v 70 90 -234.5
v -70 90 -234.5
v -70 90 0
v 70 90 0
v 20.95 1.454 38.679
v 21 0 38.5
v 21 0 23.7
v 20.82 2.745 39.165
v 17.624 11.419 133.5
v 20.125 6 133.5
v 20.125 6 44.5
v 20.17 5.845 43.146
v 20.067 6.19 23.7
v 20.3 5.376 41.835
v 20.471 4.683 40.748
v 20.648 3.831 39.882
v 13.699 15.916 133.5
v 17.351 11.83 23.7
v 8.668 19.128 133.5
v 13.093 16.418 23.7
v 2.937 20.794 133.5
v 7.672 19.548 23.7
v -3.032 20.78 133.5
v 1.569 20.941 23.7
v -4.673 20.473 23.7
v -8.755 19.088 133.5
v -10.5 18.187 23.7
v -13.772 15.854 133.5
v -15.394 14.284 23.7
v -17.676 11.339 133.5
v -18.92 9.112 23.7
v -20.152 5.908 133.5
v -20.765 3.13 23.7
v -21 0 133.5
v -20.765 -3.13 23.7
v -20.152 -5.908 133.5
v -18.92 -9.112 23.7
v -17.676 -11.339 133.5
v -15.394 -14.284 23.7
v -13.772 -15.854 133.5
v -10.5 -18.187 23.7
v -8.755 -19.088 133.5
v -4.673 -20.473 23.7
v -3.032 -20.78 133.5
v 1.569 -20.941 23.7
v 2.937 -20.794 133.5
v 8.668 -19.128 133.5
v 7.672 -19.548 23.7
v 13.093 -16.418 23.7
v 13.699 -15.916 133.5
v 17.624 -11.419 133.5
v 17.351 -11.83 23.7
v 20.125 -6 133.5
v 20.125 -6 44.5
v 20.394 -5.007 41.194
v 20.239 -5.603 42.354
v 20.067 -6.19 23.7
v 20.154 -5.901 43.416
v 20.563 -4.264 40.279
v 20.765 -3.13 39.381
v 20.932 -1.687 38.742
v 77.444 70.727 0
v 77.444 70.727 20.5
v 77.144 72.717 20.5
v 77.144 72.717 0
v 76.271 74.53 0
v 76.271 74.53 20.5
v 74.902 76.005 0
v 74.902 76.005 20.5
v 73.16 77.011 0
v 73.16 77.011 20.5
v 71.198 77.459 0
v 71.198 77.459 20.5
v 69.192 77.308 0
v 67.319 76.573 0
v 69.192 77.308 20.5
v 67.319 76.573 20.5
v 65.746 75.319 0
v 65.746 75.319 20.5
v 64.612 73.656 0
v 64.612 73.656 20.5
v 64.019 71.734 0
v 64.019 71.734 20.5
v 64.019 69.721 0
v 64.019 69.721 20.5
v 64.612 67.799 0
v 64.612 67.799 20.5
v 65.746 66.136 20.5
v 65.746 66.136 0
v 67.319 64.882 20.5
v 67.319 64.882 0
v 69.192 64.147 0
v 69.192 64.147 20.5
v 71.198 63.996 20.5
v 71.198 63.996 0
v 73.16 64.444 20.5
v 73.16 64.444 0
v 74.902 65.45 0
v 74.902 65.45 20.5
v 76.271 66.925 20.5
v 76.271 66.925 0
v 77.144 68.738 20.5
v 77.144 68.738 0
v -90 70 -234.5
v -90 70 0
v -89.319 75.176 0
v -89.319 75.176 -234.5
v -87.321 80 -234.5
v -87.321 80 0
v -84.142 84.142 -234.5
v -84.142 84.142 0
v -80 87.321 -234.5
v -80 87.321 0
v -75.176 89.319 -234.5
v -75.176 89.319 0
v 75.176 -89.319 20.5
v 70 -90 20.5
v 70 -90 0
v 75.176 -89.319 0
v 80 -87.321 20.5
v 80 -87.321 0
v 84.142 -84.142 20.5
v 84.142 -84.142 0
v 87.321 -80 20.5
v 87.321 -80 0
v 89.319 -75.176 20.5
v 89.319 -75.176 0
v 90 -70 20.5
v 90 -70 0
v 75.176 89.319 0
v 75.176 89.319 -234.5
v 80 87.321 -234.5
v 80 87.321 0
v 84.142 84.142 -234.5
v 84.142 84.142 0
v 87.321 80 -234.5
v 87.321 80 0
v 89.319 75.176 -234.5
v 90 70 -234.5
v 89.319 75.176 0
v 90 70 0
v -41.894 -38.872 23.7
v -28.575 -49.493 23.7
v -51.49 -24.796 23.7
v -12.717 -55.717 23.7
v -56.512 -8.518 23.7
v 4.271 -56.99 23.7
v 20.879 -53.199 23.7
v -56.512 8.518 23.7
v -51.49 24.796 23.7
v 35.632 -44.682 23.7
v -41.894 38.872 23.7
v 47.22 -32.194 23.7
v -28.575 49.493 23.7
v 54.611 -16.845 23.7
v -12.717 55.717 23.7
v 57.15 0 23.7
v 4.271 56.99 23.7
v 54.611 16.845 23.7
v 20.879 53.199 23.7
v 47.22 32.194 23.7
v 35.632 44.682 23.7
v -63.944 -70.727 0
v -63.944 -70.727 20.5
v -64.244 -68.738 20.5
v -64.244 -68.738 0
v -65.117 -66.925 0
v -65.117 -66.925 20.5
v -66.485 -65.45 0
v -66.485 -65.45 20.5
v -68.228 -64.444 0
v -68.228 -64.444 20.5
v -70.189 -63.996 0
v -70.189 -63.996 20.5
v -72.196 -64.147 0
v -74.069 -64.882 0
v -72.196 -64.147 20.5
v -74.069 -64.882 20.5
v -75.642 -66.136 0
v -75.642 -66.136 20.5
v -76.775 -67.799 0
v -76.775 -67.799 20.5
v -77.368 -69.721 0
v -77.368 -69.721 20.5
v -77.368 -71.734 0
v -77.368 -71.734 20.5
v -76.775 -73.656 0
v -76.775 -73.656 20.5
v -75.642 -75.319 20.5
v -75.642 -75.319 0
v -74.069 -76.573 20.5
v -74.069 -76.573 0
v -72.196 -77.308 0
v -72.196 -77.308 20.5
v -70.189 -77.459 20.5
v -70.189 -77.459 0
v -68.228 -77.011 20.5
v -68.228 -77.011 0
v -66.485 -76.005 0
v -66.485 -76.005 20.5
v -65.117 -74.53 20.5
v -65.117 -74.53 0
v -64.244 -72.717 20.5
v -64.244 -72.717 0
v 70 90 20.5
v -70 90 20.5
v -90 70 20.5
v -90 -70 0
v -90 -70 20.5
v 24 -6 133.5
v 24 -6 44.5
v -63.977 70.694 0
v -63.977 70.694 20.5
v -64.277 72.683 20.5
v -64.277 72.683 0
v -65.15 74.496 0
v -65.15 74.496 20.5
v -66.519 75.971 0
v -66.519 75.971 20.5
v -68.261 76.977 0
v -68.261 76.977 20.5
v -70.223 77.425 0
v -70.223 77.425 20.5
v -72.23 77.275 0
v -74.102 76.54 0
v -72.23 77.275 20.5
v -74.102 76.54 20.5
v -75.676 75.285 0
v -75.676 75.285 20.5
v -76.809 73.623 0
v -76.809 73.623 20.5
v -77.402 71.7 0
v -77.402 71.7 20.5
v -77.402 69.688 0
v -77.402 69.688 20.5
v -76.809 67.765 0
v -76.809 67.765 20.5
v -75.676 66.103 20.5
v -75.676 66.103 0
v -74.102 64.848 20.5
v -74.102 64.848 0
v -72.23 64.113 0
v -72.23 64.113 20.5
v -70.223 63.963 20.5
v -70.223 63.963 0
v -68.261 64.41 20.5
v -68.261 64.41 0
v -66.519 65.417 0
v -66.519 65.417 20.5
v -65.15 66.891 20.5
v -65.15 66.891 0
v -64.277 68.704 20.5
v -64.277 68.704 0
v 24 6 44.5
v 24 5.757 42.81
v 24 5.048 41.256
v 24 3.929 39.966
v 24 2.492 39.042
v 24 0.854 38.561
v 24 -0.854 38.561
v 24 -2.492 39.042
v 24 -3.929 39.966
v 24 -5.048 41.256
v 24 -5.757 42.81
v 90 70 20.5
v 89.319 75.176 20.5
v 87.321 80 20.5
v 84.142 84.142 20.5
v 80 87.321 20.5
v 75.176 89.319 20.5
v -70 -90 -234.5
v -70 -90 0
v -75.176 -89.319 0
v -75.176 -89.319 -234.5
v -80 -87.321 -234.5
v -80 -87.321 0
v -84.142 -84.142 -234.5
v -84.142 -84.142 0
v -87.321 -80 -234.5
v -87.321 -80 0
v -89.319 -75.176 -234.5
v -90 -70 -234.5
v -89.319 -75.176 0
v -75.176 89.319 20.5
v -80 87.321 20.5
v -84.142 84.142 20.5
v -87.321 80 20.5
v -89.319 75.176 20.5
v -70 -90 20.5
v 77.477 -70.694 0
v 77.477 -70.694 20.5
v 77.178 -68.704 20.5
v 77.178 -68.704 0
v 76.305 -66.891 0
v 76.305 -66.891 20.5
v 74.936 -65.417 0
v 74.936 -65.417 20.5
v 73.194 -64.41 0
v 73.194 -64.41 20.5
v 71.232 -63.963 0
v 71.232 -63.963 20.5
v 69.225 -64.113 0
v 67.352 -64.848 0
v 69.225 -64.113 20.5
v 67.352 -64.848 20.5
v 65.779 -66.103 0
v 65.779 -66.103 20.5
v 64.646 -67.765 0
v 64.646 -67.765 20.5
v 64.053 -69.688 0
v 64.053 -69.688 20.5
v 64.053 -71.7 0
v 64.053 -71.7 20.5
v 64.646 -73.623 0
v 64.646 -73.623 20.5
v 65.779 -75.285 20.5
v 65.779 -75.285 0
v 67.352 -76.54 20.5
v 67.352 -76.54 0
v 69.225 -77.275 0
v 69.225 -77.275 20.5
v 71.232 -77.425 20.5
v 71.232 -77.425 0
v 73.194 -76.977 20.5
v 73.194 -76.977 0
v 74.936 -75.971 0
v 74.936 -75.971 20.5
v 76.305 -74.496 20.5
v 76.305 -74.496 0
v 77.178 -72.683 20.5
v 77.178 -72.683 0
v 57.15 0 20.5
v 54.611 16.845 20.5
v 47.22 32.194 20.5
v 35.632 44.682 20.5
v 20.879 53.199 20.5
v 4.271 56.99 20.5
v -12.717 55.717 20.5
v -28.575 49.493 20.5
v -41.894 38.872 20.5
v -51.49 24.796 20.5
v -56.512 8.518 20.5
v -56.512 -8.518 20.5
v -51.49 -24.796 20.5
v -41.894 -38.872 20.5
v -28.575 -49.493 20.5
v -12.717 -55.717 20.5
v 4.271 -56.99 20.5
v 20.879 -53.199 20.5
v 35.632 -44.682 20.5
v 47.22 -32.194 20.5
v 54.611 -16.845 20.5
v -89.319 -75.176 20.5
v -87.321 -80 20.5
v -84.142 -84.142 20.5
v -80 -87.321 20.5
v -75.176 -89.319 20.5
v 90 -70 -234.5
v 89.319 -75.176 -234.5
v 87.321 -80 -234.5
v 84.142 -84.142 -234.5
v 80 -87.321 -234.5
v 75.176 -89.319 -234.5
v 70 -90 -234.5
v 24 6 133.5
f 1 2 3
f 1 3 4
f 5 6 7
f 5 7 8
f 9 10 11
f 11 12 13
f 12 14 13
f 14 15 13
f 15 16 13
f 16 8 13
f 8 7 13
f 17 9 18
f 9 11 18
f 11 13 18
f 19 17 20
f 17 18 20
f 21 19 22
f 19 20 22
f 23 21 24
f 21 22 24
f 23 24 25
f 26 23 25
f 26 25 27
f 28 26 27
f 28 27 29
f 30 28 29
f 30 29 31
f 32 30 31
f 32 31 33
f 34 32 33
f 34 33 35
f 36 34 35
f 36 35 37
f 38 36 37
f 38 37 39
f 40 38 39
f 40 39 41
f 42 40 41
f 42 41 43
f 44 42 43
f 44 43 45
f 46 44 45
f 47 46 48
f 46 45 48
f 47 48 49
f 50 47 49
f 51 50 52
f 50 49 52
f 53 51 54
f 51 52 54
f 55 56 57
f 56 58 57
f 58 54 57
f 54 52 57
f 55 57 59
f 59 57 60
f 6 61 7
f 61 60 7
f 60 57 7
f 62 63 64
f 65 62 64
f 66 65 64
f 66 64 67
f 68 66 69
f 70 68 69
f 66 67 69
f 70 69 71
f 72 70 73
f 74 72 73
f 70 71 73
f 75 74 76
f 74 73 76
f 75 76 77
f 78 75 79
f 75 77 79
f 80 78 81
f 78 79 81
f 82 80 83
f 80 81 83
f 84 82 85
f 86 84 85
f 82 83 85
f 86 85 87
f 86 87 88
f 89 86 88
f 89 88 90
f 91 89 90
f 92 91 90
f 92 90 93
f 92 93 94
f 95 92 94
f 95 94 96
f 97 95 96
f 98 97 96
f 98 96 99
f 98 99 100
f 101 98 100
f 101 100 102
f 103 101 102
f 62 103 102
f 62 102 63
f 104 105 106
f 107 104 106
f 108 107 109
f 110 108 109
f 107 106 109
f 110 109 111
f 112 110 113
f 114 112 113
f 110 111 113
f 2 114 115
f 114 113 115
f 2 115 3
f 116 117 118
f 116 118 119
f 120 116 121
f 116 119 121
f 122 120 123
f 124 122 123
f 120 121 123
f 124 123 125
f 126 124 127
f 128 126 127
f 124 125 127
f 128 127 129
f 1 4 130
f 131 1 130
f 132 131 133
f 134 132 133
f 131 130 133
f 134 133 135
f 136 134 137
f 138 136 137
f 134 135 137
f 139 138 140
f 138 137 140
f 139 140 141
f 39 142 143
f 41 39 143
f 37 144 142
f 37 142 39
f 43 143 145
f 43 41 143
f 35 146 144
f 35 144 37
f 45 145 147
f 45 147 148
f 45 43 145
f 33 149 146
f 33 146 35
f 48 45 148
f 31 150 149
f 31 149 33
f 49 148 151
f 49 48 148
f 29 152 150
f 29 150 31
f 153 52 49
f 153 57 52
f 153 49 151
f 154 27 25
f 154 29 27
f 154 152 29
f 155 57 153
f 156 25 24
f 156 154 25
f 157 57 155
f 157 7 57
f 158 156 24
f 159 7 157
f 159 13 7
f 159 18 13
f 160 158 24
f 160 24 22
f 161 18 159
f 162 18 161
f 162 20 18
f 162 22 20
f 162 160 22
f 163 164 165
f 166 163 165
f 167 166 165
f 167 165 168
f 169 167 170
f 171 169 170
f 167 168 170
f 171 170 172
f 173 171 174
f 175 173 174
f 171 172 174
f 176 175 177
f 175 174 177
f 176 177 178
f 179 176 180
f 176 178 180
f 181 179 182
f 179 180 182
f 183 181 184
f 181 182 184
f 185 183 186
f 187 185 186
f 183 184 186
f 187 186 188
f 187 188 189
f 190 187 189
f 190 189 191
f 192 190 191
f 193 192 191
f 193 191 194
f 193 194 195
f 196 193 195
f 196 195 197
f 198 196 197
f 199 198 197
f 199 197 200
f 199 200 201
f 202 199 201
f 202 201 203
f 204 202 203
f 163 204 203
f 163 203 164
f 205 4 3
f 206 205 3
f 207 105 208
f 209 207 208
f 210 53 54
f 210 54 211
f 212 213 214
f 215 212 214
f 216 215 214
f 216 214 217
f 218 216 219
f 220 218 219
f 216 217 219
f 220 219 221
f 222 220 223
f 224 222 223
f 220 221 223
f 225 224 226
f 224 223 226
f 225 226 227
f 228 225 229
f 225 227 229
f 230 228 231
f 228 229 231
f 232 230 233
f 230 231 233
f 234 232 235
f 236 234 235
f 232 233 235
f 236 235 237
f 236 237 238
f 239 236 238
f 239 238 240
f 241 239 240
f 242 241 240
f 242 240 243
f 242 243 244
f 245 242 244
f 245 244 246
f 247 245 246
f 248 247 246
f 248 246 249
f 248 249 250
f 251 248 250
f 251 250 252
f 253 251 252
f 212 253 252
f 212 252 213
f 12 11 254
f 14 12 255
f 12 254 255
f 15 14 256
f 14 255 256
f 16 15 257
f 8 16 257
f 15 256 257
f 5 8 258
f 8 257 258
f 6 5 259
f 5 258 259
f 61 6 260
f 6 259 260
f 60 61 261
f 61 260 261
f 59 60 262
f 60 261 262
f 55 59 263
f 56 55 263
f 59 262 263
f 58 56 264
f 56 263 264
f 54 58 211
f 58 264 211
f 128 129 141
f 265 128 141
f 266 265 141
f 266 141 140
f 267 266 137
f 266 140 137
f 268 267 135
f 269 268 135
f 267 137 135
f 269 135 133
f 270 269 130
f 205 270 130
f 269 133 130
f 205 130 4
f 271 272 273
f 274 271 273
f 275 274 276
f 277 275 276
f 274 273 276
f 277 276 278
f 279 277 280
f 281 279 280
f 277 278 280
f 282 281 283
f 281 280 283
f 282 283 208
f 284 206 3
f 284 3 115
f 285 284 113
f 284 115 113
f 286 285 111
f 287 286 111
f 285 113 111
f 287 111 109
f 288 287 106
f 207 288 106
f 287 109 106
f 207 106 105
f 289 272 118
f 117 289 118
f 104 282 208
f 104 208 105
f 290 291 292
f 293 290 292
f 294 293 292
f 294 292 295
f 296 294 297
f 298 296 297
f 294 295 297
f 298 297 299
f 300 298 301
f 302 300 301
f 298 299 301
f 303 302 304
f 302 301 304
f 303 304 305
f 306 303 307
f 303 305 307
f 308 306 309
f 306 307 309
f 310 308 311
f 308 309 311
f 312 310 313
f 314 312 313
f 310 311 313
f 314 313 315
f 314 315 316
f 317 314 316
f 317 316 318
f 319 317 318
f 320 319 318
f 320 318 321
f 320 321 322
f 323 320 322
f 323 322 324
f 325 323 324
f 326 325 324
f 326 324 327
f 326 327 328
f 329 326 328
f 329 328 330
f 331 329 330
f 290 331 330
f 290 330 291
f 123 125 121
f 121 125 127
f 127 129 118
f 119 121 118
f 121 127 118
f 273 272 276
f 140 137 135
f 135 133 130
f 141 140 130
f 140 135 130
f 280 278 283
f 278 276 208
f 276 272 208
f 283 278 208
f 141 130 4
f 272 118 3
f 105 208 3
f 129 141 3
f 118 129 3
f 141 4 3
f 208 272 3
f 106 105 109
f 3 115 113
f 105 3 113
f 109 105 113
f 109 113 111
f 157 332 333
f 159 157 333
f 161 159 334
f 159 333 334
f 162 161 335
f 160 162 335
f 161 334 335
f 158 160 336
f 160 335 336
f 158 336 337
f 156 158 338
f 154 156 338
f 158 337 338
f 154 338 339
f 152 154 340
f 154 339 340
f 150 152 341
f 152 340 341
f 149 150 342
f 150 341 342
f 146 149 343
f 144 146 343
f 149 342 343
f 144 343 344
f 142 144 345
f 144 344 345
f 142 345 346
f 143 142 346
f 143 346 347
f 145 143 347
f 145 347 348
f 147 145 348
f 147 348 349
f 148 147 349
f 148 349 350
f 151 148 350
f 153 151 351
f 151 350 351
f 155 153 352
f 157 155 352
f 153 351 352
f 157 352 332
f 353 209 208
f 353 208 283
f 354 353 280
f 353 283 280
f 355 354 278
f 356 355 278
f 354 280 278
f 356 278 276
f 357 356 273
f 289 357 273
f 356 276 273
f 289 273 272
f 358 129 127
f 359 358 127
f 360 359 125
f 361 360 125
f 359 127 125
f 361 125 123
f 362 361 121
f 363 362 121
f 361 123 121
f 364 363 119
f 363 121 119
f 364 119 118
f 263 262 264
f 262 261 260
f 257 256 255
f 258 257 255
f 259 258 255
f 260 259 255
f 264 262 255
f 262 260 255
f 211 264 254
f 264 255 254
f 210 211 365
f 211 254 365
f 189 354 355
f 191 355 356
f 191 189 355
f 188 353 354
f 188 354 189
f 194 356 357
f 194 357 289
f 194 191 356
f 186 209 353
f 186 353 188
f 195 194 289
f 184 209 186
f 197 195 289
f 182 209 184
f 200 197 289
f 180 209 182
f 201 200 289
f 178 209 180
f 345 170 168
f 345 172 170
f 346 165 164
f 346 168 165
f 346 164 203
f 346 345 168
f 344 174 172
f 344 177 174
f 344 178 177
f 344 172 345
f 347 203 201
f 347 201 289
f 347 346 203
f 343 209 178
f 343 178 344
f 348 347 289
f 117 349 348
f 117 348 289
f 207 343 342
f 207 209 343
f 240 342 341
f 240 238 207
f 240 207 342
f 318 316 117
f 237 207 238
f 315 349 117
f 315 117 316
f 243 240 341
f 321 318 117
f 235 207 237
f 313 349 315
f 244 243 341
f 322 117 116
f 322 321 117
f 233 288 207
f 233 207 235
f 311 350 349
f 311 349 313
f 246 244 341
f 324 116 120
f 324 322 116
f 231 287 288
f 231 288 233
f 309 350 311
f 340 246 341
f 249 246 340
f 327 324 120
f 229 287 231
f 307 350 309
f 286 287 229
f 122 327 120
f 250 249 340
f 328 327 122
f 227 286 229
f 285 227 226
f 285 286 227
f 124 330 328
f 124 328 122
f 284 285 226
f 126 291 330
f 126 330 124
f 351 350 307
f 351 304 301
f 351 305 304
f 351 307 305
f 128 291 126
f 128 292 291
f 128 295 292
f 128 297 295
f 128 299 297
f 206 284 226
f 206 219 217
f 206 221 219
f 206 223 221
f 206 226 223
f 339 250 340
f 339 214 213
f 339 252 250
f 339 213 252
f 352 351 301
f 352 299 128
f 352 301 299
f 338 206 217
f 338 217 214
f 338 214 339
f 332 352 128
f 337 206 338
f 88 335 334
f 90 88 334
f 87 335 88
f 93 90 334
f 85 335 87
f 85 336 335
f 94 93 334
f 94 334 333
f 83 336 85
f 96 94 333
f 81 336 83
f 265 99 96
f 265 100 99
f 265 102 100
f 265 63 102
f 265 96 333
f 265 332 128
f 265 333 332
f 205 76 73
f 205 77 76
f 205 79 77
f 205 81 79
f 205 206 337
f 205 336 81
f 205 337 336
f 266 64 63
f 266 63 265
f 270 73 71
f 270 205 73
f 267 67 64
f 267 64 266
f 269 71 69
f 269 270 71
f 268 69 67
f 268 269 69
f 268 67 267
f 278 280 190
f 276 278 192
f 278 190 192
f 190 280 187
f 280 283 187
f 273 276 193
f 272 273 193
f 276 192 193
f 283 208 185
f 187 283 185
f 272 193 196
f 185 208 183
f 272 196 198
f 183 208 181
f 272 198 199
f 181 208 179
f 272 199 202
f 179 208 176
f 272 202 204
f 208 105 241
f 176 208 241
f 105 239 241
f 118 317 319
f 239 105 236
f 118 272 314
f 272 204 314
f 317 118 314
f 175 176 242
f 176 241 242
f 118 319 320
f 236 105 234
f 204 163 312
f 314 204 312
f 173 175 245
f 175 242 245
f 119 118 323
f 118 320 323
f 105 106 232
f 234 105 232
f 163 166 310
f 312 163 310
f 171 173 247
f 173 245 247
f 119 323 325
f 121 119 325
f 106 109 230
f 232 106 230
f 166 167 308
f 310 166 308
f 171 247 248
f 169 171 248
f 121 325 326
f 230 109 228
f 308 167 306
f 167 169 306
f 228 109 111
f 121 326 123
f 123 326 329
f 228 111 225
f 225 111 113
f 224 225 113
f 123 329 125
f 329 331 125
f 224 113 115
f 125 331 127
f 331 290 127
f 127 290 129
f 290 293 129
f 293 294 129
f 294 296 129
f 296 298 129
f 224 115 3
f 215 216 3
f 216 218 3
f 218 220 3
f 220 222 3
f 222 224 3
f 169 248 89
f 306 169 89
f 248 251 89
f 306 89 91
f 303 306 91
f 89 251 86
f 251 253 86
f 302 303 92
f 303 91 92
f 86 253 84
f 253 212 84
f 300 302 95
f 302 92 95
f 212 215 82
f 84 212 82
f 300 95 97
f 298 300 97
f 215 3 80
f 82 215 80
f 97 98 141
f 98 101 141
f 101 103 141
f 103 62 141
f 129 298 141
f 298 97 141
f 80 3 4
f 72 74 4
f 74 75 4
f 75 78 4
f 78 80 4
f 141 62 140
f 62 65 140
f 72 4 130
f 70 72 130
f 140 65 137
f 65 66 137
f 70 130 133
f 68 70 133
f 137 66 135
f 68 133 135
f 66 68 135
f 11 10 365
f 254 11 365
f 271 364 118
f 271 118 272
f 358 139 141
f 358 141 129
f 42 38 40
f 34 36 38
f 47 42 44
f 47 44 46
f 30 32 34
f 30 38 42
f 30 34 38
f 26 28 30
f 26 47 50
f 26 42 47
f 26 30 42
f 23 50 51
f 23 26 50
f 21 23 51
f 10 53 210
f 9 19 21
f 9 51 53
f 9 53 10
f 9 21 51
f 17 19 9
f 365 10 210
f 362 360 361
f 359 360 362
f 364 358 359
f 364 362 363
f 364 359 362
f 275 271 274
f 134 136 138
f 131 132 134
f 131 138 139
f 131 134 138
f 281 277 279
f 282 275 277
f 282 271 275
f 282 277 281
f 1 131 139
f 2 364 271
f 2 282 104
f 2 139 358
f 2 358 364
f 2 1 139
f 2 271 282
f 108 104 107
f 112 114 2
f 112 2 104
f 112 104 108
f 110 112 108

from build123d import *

# Parameters (mm, degrees)
EXTRUDE_1_DEPTH      = 20.5
CUT_EXTRUDE_1_REACH  = 130.92
SKETCH_2_R           = 6.75
EXTRUDE_2_DEPTH      = 234.5
SKETCH_4_R           = 57.15
EXTRUDE_3_DEPTH      = 3.2
SKETCH_5_R           = 21
EXTRUDE_4_DEPTH      = 109.8
SKETCH_6_W           = 8
SKETCH_6_H           = 12
EXTRUDE_5_DEPTH      = 89
EXTRUDE_6_REACH      = 277.837
EXTRUDE_6_END_RADIUS = 21


with BuildPart() as part:
    # 草图1 → 凸台-拉伸1 (new body)
    with BuildSketch(Plane.XY):
        with BuildLine():
            Line((-70, -90), (70, -90))
            ThreePointArc((70, -90), (84.142135624, -84.142135624), (90, -70))
            Line((90, -70), (90, 70))
            ThreePointArc((90, 70), (84.142135624, 84.142135624), (70, 90))
            Line((70, 90), (-70, 90))
            ThreePointArc((-70, 90), (-84.142135624, 84.142135624), (-90, 70))
            Line((-90, 70), (-90, -70))
            ThreePointArc((-90, -70), (-84.142135624, -84.142135624), (-70, -90))
        make_face()
    extrude(amount=EXTRUDE_1_DEPTH)

    # 草图2 → 切除-拉伸1 (cut, up to next)
    with BuildSketch(Plane.XY.offset(20.5), mode=Mode.PRIVATE) as cut_extrude_1_sk1:
        with Locations((-70.72748515, 70.693867092)):
            Circle(SKETCH_2_R)
    cut_extrude_1_tool1 = extrude(cut_extrude_1_sk1.sketch, amount=-CUT_EXTRUDE_1_REACH, mode=Mode.PRIVATE) & part.part
    # 草图2 → 切除-拉伸1 (cut, up to next)
    with BuildSketch(Plane.XY.offset(20.5), mode=Mode.PRIVATE) as cut_extrude_1_sk2:
        with Locations((70.693867092, 70.72748515)):
            Circle(SKETCH_2_R)
    cut_extrude_1_tool2 = extrude(cut_extrude_1_sk2.sketch, amount=-CUT_EXTRUDE_1_REACH, mode=Mode.PRIVATE) & part.part
    # 草图2 → 切除-拉伸1 (cut, up to next)
    with BuildSketch(Plane.XY.offset(20.5), mode=Mode.PRIVATE) as cut_extrude_1_sk3:
        with Locations((70.72748515, -70.693867092)):
            Circle(SKETCH_2_R)
    cut_extrude_1_tool3 = extrude(cut_extrude_1_sk3.sketch, amount=-CUT_EXTRUDE_1_REACH, mode=Mode.PRIVATE) & part.part
    # 草图2 → 切除-拉伸1 (cut, up to next)
    with BuildSketch(Plane.XY.offset(20.5), mode=Mode.PRIVATE) as cut_extrude_1_sk4:
        with Locations((-70.693867092, -70.72748515)):
            Circle(SKETCH_2_R)
    cut_extrude_1_tool4 = extrude(cut_extrude_1_sk4.sketch, amount=-CUT_EXTRUDE_1_REACH, mode=Mode.PRIVATE) & part.part
    add(cut_extrude_1_tool1.solids().sort_by_distance((-70.727485, 70.693867, 20.5))[0], mode=Mode.SUBTRACT)
    add(cut_extrude_1_tool2.solids().sort_by_distance((70.693867, 70.727485, 20.5))[0], mode=Mode.SUBTRACT)
    add(cut_extrude_1_tool3.solids().sort_by_distance((70.727485, -70.693867, 20.5))[0], mode=Mode.SUBTRACT)
    add(cut_extrude_1_tool4.solids().sort_by_distance((-70.693867, -70.727485, 20.5))[0], mode=Mode.SUBTRACT)

    # 草图4 → 凸台-拉伸3 (add)
    with BuildSketch(Plane.XY.offset(20.5)):
        Circle(SKETCH_4_R)
    extrude(amount=EXTRUDE_3_DEPTH)

    # 草图5 → 凸台-拉伸4 (add)
    with BuildSketch(Plane.XY.offset(23.7)):
        Circle(SKETCH_5_R)
    extrude(amount=EXTRUDE_4_DEPTH)

    # 草图6 → 凸台-拉伸5 (add)
    with BuildSketch(Plane.XY.offset(133.5)):
        with Locations((20, 0)):
            Rectangle(SKETCH_6_W, SKETCH_6_H)
    extrude(amount=-EXTRUDE_5_DEPTH)

    # 凸台-拉伸6: up to this cylinder (the profile starts outside it)
    extrude_6_end = Plane(origin=(0, 0, 41.953521), z_dir=(0, 0, -1)) * Cylinder(EXTRUDE_6_END_RADIUS, 598.674, mode=Mode.PRIVATE)
    # 草图7 → 凸台-拉伸6 (add, up to the surface)
    with BuildSketch(Plane(origin=(24, 0, 0), x_dir=(0, 0, -1), z_dir=(1, 0, 0)), mode=Mode.PRIVATE) as extrude_6_sk1:
        with BuildLine():
            Line((-44.5, -6), (-44.5, 6))
            ThreePointArc((-44.5, 6), (-38.5, 0), (-44.5, -6))
        make_face()
    extrude_6_tool1 = extrude(extrude_6_sk1.sketch, amount=-EXTRUDE_6_REACH, mode=Mode.PRIVATE) - extrude_6_end
    add(extrude_6_tool1.solids().sort_by_distance((24, 0, 41.953521))[0])


with BuildPart() as body_2:
    # 草图3 → 凸台-拉伸2 (new body)
    with BuildSketch(Plane(origin=(0, 0, 0), x_dir=(-1, 0, 0), z_dir=(0, 0, -1))):
        with BuildLine():
            Line((-70, -90), (70, -90))
            ThreePointArc((70, -90), (84.142135624, -84.142135624), (90, -70))
            Line((90, -70), (90, 70))
            ThreePointArc((90, 70), (84.142135624, 84.142135624), (70, 90))
            Line((70, 90), (-70, 90))
            ThreePointArc((-70, 90), (-84.142135624, 84.142135624), (-90, 70))
            Line((-90, 70), (-90, -70))
            ThreePointArc((-90, -70), (-84.142135624, -84.142135624), (-70, -90))
        make_face()
    extrude(amount=EXTRUDE_2_DEPTH)


solid = Compound([part.part, body_2.part])
